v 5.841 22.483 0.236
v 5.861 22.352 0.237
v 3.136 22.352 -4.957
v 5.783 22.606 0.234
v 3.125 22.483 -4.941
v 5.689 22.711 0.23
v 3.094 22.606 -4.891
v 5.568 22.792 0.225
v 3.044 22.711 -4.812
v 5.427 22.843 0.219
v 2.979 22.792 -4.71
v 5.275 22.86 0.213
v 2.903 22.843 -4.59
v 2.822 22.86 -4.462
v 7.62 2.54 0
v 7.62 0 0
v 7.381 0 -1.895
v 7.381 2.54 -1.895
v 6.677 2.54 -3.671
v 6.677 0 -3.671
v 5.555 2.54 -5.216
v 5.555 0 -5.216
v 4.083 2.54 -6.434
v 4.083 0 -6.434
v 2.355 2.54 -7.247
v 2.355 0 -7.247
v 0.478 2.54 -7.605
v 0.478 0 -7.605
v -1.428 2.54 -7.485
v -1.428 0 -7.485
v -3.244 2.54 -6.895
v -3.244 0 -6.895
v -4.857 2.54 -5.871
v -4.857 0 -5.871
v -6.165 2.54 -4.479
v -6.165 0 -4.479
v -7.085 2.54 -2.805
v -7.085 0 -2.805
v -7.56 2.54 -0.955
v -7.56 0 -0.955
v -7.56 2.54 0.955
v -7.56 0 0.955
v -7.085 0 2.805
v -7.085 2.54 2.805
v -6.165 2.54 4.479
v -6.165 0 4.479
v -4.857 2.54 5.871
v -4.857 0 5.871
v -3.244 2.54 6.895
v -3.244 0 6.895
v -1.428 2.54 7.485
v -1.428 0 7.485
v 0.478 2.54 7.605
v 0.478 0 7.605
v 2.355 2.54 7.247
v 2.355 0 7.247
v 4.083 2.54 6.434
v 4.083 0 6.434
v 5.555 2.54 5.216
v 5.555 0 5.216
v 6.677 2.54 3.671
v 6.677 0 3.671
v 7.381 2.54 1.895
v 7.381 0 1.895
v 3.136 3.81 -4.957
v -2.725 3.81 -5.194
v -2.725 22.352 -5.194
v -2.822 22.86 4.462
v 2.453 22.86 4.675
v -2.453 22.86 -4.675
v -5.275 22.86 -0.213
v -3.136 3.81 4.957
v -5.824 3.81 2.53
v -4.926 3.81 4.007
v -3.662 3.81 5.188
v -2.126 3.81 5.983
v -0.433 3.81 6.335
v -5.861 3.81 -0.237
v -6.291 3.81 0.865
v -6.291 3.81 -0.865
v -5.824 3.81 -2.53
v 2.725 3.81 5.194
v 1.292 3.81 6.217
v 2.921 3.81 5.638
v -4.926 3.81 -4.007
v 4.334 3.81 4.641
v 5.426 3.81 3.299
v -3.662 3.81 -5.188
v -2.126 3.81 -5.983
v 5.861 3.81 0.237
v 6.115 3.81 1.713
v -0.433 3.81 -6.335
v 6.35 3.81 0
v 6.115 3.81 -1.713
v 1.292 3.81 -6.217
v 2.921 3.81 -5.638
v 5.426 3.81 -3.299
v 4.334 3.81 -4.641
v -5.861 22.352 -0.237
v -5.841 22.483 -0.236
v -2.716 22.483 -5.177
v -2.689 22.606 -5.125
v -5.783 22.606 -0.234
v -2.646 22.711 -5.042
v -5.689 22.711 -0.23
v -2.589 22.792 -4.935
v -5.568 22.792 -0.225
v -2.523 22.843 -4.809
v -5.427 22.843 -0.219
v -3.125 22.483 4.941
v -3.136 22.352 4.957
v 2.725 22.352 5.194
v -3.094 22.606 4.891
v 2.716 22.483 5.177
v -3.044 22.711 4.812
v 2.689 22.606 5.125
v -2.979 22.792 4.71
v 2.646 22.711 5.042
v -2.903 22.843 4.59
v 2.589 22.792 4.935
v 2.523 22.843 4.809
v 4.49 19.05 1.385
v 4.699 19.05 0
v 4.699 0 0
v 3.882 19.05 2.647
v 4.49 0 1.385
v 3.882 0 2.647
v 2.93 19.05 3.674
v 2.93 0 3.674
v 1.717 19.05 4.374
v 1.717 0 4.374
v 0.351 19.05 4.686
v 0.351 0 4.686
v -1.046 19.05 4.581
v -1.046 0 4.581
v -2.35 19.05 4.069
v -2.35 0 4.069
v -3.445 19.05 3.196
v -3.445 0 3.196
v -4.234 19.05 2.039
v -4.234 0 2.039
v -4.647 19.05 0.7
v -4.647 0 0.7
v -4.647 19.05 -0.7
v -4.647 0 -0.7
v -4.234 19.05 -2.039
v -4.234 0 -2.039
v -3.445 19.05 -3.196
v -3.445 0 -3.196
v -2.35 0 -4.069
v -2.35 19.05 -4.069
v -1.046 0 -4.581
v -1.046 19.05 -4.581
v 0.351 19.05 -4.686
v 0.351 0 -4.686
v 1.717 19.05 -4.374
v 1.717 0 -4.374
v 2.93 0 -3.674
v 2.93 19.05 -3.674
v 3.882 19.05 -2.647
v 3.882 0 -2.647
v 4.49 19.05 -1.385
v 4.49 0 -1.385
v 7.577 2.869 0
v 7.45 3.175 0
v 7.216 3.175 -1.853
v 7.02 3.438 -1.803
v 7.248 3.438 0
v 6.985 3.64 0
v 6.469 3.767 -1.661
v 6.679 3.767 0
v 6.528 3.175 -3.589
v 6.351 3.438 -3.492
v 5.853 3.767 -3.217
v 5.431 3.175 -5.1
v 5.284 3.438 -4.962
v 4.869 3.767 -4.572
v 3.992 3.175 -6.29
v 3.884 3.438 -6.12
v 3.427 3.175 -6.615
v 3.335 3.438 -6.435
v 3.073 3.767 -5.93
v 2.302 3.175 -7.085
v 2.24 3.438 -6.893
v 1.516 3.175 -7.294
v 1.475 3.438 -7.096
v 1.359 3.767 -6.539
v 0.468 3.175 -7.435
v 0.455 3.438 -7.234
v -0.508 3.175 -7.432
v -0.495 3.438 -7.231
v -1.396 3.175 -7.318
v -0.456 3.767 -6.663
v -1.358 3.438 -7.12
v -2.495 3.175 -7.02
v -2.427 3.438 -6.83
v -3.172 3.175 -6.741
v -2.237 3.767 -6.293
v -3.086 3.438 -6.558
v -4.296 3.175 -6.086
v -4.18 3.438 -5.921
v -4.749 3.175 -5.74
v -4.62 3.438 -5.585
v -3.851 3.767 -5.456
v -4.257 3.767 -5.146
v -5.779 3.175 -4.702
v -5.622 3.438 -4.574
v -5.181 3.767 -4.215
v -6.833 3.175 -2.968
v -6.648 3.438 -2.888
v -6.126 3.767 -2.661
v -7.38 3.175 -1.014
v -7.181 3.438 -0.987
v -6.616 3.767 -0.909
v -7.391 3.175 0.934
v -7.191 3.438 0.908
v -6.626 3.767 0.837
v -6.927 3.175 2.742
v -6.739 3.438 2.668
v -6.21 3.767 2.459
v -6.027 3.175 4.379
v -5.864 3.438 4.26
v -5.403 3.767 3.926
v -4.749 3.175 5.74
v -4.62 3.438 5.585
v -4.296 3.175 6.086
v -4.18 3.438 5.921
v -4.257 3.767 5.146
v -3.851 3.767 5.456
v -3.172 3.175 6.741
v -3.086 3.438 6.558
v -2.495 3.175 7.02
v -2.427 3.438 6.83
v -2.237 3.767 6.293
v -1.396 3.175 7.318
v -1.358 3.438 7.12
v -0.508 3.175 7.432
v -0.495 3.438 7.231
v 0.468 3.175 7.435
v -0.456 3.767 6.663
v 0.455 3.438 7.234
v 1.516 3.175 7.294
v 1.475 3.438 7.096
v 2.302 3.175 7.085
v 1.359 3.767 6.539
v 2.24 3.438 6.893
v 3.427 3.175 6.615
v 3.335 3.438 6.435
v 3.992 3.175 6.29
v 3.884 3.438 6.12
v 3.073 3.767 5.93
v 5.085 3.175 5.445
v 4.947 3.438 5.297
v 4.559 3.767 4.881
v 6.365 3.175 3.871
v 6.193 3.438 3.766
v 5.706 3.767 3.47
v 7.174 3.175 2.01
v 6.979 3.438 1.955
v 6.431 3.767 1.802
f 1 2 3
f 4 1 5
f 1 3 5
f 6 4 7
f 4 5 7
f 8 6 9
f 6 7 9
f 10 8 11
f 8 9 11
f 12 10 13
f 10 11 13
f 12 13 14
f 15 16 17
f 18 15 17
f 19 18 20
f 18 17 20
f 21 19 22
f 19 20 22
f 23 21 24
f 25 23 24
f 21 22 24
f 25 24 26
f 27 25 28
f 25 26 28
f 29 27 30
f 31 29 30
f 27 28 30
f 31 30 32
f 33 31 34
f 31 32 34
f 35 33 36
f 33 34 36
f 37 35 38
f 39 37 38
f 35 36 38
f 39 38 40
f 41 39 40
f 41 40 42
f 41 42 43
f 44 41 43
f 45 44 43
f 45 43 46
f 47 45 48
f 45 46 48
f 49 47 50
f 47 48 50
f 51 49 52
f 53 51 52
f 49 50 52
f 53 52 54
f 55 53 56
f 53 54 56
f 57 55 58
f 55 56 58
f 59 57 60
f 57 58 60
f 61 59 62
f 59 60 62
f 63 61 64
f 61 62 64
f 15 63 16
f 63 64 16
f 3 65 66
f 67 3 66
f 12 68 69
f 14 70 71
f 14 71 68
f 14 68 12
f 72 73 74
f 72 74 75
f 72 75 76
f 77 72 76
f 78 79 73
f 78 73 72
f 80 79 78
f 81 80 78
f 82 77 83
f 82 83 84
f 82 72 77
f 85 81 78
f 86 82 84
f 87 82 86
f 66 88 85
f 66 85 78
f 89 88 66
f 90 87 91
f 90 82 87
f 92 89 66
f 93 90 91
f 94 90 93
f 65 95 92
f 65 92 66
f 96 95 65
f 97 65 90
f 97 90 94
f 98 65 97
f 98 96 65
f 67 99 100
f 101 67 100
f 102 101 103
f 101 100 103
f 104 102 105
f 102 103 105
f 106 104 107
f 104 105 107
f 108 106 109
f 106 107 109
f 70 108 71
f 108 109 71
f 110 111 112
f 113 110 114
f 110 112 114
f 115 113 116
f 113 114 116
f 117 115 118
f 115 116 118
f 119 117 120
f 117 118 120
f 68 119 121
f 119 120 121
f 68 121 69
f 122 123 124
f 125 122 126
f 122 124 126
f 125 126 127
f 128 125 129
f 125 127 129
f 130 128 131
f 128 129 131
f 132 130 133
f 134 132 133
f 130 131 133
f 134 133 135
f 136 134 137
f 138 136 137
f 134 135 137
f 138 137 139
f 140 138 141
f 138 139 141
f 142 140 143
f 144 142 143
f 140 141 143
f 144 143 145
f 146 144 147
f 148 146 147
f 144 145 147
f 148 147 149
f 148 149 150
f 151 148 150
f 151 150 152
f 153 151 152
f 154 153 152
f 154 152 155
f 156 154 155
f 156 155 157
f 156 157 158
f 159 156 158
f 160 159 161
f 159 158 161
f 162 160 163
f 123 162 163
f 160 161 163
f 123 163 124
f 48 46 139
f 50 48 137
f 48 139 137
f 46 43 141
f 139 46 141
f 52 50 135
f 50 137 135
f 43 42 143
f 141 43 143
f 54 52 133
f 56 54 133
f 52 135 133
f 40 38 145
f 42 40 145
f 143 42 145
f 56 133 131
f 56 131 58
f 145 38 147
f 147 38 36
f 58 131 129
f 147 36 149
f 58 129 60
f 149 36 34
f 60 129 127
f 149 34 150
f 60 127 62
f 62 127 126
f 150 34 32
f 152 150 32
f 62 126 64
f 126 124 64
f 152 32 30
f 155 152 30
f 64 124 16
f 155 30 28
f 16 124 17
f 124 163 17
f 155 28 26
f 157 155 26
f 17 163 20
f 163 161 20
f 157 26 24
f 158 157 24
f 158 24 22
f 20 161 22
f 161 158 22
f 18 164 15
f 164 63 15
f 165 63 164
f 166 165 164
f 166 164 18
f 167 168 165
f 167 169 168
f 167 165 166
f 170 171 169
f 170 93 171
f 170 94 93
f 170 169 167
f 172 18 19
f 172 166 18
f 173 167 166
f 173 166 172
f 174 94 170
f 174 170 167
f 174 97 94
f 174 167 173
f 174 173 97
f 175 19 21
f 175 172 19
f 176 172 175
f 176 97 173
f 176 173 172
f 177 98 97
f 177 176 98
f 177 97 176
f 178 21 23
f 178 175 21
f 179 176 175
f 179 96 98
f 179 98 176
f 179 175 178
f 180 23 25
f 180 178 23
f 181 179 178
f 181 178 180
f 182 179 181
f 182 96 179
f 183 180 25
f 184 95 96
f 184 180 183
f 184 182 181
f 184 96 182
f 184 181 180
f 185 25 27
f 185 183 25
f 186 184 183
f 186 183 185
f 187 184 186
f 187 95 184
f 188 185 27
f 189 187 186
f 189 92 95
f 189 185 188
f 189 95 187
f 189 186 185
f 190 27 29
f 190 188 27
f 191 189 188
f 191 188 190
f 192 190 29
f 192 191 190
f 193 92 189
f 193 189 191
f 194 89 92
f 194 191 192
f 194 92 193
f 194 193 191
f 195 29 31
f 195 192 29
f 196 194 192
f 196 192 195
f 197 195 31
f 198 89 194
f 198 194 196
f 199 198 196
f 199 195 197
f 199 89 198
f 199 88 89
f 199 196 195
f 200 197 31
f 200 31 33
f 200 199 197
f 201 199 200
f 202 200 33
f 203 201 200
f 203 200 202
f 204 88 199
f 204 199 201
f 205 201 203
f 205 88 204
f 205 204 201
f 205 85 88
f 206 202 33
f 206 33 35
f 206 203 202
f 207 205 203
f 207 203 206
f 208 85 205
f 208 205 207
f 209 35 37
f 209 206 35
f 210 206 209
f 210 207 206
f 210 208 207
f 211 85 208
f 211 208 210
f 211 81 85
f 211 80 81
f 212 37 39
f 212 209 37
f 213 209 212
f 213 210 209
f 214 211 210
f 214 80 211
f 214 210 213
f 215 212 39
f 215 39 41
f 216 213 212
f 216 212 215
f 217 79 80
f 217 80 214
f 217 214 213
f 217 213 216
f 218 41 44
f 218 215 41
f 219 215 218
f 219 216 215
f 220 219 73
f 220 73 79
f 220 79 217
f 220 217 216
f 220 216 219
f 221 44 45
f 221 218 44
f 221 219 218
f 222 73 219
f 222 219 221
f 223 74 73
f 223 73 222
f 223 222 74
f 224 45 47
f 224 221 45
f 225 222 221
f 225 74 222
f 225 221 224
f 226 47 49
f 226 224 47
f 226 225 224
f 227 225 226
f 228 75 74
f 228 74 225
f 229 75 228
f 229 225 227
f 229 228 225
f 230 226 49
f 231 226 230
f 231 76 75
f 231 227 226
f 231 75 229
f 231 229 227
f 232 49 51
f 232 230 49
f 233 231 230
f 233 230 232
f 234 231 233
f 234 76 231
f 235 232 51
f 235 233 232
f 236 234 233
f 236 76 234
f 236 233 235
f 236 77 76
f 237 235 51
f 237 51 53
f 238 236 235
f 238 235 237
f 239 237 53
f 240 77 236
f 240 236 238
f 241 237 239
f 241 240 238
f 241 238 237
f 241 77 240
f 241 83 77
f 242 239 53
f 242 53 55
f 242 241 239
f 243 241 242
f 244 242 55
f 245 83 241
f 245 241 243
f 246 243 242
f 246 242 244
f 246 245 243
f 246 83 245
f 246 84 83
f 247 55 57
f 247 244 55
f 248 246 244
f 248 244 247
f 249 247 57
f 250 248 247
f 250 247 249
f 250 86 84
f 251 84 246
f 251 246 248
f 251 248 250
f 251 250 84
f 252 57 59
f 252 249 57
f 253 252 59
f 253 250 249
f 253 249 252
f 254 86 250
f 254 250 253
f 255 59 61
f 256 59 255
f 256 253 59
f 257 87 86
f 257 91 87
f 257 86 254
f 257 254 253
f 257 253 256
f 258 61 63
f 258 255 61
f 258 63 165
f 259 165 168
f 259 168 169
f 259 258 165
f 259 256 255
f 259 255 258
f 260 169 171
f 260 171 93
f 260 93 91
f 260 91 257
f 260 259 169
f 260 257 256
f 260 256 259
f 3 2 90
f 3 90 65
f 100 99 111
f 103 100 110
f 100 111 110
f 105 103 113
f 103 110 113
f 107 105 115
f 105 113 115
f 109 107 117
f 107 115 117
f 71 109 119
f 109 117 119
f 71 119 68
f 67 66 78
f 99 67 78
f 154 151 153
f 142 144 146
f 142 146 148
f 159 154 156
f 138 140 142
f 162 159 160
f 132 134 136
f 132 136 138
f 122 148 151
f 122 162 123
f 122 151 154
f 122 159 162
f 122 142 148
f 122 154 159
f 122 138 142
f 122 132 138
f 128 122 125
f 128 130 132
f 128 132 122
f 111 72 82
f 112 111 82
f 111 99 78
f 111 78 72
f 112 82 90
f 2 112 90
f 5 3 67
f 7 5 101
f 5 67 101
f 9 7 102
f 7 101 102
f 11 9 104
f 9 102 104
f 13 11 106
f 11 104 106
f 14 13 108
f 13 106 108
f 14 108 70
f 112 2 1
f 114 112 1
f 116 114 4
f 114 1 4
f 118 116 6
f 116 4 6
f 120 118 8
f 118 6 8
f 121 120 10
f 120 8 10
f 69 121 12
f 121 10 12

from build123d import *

# Parameters (mm, degrees)
SKETCH1_R           = 7.62
BOSS_EXTRUDE1_DEPTH = 3.81
BOSS_EXTRUDE2_DEPTH = 19.05
FILLET1_R           = 1.27
FILLET2_R           = 0.508
SKETCH3_R           = 4.699
CUT_EXTRUDE1_DEPTH  = 19.05


with BuildPart() as part:
    # Sketch1 → Boss-Extrude1 (new body)
    with BuildSketch(Plane(origin=(0, 0, 0), x_dir=(1, 0, 0), z_dir=(0, 1, 0))):
        Circle(SKETCH1_R)
    extrude(amount=BOSS_EXTRUDE1_DEPTH)

    # Sketch2 → Boss-Extrude2 (add)
    with BuildSketch(Plane(origin=(0, 3.81, 0), x_dir=(1, 0, 0), z_dir=(0, 1, 0))):
        Polygon((5.861093772, -0.236882109), (3.13569281, 4.957415046), (-2.725400962, 5.194297155), (-5.861093772, 0.236882109), (-3.13569281, -4.957415046), (2.725400962, -5.194297155), align=None)
    extrude(amount=BOSS_EXTRUDE2_DEPTH)

    # Fillet1
    fillet1_edges = [part.edges().sort_by_distance(p)[0] for p in [
        (-7.62, 3.81, 0),
    ]]
    fillet(fillet1_edges, radius=FILLET1_R)

    # Fillet2
    fillet2_edges = [part.edges().sort_by_distance(p)[0] for p in [
        (4.293247367, 22.86, 2.715589632),
        (4.498393291, 22.86, -2.360266469),
        (0.205145924, 22.86, -5.0758561),
        (-4.293247367, 22.86, -2.715589632),
        (-4.498393291, 22.86, 2.360266469),
        (-0.205145924, 22.86, 5.0758561),
    ]]
    fillet(fillet2_edges, radius=FILLET2_R)

    # Sketch3 → Cut-Extrude1 (cut)
    with BuildSketch(Plane.XZ):
        Circle(SKETCH3_R)
    extrude(amount=-CUT_EXTRUDE1_DEPTH, mode=Mode.SUBTRACT)


solid = part.part
